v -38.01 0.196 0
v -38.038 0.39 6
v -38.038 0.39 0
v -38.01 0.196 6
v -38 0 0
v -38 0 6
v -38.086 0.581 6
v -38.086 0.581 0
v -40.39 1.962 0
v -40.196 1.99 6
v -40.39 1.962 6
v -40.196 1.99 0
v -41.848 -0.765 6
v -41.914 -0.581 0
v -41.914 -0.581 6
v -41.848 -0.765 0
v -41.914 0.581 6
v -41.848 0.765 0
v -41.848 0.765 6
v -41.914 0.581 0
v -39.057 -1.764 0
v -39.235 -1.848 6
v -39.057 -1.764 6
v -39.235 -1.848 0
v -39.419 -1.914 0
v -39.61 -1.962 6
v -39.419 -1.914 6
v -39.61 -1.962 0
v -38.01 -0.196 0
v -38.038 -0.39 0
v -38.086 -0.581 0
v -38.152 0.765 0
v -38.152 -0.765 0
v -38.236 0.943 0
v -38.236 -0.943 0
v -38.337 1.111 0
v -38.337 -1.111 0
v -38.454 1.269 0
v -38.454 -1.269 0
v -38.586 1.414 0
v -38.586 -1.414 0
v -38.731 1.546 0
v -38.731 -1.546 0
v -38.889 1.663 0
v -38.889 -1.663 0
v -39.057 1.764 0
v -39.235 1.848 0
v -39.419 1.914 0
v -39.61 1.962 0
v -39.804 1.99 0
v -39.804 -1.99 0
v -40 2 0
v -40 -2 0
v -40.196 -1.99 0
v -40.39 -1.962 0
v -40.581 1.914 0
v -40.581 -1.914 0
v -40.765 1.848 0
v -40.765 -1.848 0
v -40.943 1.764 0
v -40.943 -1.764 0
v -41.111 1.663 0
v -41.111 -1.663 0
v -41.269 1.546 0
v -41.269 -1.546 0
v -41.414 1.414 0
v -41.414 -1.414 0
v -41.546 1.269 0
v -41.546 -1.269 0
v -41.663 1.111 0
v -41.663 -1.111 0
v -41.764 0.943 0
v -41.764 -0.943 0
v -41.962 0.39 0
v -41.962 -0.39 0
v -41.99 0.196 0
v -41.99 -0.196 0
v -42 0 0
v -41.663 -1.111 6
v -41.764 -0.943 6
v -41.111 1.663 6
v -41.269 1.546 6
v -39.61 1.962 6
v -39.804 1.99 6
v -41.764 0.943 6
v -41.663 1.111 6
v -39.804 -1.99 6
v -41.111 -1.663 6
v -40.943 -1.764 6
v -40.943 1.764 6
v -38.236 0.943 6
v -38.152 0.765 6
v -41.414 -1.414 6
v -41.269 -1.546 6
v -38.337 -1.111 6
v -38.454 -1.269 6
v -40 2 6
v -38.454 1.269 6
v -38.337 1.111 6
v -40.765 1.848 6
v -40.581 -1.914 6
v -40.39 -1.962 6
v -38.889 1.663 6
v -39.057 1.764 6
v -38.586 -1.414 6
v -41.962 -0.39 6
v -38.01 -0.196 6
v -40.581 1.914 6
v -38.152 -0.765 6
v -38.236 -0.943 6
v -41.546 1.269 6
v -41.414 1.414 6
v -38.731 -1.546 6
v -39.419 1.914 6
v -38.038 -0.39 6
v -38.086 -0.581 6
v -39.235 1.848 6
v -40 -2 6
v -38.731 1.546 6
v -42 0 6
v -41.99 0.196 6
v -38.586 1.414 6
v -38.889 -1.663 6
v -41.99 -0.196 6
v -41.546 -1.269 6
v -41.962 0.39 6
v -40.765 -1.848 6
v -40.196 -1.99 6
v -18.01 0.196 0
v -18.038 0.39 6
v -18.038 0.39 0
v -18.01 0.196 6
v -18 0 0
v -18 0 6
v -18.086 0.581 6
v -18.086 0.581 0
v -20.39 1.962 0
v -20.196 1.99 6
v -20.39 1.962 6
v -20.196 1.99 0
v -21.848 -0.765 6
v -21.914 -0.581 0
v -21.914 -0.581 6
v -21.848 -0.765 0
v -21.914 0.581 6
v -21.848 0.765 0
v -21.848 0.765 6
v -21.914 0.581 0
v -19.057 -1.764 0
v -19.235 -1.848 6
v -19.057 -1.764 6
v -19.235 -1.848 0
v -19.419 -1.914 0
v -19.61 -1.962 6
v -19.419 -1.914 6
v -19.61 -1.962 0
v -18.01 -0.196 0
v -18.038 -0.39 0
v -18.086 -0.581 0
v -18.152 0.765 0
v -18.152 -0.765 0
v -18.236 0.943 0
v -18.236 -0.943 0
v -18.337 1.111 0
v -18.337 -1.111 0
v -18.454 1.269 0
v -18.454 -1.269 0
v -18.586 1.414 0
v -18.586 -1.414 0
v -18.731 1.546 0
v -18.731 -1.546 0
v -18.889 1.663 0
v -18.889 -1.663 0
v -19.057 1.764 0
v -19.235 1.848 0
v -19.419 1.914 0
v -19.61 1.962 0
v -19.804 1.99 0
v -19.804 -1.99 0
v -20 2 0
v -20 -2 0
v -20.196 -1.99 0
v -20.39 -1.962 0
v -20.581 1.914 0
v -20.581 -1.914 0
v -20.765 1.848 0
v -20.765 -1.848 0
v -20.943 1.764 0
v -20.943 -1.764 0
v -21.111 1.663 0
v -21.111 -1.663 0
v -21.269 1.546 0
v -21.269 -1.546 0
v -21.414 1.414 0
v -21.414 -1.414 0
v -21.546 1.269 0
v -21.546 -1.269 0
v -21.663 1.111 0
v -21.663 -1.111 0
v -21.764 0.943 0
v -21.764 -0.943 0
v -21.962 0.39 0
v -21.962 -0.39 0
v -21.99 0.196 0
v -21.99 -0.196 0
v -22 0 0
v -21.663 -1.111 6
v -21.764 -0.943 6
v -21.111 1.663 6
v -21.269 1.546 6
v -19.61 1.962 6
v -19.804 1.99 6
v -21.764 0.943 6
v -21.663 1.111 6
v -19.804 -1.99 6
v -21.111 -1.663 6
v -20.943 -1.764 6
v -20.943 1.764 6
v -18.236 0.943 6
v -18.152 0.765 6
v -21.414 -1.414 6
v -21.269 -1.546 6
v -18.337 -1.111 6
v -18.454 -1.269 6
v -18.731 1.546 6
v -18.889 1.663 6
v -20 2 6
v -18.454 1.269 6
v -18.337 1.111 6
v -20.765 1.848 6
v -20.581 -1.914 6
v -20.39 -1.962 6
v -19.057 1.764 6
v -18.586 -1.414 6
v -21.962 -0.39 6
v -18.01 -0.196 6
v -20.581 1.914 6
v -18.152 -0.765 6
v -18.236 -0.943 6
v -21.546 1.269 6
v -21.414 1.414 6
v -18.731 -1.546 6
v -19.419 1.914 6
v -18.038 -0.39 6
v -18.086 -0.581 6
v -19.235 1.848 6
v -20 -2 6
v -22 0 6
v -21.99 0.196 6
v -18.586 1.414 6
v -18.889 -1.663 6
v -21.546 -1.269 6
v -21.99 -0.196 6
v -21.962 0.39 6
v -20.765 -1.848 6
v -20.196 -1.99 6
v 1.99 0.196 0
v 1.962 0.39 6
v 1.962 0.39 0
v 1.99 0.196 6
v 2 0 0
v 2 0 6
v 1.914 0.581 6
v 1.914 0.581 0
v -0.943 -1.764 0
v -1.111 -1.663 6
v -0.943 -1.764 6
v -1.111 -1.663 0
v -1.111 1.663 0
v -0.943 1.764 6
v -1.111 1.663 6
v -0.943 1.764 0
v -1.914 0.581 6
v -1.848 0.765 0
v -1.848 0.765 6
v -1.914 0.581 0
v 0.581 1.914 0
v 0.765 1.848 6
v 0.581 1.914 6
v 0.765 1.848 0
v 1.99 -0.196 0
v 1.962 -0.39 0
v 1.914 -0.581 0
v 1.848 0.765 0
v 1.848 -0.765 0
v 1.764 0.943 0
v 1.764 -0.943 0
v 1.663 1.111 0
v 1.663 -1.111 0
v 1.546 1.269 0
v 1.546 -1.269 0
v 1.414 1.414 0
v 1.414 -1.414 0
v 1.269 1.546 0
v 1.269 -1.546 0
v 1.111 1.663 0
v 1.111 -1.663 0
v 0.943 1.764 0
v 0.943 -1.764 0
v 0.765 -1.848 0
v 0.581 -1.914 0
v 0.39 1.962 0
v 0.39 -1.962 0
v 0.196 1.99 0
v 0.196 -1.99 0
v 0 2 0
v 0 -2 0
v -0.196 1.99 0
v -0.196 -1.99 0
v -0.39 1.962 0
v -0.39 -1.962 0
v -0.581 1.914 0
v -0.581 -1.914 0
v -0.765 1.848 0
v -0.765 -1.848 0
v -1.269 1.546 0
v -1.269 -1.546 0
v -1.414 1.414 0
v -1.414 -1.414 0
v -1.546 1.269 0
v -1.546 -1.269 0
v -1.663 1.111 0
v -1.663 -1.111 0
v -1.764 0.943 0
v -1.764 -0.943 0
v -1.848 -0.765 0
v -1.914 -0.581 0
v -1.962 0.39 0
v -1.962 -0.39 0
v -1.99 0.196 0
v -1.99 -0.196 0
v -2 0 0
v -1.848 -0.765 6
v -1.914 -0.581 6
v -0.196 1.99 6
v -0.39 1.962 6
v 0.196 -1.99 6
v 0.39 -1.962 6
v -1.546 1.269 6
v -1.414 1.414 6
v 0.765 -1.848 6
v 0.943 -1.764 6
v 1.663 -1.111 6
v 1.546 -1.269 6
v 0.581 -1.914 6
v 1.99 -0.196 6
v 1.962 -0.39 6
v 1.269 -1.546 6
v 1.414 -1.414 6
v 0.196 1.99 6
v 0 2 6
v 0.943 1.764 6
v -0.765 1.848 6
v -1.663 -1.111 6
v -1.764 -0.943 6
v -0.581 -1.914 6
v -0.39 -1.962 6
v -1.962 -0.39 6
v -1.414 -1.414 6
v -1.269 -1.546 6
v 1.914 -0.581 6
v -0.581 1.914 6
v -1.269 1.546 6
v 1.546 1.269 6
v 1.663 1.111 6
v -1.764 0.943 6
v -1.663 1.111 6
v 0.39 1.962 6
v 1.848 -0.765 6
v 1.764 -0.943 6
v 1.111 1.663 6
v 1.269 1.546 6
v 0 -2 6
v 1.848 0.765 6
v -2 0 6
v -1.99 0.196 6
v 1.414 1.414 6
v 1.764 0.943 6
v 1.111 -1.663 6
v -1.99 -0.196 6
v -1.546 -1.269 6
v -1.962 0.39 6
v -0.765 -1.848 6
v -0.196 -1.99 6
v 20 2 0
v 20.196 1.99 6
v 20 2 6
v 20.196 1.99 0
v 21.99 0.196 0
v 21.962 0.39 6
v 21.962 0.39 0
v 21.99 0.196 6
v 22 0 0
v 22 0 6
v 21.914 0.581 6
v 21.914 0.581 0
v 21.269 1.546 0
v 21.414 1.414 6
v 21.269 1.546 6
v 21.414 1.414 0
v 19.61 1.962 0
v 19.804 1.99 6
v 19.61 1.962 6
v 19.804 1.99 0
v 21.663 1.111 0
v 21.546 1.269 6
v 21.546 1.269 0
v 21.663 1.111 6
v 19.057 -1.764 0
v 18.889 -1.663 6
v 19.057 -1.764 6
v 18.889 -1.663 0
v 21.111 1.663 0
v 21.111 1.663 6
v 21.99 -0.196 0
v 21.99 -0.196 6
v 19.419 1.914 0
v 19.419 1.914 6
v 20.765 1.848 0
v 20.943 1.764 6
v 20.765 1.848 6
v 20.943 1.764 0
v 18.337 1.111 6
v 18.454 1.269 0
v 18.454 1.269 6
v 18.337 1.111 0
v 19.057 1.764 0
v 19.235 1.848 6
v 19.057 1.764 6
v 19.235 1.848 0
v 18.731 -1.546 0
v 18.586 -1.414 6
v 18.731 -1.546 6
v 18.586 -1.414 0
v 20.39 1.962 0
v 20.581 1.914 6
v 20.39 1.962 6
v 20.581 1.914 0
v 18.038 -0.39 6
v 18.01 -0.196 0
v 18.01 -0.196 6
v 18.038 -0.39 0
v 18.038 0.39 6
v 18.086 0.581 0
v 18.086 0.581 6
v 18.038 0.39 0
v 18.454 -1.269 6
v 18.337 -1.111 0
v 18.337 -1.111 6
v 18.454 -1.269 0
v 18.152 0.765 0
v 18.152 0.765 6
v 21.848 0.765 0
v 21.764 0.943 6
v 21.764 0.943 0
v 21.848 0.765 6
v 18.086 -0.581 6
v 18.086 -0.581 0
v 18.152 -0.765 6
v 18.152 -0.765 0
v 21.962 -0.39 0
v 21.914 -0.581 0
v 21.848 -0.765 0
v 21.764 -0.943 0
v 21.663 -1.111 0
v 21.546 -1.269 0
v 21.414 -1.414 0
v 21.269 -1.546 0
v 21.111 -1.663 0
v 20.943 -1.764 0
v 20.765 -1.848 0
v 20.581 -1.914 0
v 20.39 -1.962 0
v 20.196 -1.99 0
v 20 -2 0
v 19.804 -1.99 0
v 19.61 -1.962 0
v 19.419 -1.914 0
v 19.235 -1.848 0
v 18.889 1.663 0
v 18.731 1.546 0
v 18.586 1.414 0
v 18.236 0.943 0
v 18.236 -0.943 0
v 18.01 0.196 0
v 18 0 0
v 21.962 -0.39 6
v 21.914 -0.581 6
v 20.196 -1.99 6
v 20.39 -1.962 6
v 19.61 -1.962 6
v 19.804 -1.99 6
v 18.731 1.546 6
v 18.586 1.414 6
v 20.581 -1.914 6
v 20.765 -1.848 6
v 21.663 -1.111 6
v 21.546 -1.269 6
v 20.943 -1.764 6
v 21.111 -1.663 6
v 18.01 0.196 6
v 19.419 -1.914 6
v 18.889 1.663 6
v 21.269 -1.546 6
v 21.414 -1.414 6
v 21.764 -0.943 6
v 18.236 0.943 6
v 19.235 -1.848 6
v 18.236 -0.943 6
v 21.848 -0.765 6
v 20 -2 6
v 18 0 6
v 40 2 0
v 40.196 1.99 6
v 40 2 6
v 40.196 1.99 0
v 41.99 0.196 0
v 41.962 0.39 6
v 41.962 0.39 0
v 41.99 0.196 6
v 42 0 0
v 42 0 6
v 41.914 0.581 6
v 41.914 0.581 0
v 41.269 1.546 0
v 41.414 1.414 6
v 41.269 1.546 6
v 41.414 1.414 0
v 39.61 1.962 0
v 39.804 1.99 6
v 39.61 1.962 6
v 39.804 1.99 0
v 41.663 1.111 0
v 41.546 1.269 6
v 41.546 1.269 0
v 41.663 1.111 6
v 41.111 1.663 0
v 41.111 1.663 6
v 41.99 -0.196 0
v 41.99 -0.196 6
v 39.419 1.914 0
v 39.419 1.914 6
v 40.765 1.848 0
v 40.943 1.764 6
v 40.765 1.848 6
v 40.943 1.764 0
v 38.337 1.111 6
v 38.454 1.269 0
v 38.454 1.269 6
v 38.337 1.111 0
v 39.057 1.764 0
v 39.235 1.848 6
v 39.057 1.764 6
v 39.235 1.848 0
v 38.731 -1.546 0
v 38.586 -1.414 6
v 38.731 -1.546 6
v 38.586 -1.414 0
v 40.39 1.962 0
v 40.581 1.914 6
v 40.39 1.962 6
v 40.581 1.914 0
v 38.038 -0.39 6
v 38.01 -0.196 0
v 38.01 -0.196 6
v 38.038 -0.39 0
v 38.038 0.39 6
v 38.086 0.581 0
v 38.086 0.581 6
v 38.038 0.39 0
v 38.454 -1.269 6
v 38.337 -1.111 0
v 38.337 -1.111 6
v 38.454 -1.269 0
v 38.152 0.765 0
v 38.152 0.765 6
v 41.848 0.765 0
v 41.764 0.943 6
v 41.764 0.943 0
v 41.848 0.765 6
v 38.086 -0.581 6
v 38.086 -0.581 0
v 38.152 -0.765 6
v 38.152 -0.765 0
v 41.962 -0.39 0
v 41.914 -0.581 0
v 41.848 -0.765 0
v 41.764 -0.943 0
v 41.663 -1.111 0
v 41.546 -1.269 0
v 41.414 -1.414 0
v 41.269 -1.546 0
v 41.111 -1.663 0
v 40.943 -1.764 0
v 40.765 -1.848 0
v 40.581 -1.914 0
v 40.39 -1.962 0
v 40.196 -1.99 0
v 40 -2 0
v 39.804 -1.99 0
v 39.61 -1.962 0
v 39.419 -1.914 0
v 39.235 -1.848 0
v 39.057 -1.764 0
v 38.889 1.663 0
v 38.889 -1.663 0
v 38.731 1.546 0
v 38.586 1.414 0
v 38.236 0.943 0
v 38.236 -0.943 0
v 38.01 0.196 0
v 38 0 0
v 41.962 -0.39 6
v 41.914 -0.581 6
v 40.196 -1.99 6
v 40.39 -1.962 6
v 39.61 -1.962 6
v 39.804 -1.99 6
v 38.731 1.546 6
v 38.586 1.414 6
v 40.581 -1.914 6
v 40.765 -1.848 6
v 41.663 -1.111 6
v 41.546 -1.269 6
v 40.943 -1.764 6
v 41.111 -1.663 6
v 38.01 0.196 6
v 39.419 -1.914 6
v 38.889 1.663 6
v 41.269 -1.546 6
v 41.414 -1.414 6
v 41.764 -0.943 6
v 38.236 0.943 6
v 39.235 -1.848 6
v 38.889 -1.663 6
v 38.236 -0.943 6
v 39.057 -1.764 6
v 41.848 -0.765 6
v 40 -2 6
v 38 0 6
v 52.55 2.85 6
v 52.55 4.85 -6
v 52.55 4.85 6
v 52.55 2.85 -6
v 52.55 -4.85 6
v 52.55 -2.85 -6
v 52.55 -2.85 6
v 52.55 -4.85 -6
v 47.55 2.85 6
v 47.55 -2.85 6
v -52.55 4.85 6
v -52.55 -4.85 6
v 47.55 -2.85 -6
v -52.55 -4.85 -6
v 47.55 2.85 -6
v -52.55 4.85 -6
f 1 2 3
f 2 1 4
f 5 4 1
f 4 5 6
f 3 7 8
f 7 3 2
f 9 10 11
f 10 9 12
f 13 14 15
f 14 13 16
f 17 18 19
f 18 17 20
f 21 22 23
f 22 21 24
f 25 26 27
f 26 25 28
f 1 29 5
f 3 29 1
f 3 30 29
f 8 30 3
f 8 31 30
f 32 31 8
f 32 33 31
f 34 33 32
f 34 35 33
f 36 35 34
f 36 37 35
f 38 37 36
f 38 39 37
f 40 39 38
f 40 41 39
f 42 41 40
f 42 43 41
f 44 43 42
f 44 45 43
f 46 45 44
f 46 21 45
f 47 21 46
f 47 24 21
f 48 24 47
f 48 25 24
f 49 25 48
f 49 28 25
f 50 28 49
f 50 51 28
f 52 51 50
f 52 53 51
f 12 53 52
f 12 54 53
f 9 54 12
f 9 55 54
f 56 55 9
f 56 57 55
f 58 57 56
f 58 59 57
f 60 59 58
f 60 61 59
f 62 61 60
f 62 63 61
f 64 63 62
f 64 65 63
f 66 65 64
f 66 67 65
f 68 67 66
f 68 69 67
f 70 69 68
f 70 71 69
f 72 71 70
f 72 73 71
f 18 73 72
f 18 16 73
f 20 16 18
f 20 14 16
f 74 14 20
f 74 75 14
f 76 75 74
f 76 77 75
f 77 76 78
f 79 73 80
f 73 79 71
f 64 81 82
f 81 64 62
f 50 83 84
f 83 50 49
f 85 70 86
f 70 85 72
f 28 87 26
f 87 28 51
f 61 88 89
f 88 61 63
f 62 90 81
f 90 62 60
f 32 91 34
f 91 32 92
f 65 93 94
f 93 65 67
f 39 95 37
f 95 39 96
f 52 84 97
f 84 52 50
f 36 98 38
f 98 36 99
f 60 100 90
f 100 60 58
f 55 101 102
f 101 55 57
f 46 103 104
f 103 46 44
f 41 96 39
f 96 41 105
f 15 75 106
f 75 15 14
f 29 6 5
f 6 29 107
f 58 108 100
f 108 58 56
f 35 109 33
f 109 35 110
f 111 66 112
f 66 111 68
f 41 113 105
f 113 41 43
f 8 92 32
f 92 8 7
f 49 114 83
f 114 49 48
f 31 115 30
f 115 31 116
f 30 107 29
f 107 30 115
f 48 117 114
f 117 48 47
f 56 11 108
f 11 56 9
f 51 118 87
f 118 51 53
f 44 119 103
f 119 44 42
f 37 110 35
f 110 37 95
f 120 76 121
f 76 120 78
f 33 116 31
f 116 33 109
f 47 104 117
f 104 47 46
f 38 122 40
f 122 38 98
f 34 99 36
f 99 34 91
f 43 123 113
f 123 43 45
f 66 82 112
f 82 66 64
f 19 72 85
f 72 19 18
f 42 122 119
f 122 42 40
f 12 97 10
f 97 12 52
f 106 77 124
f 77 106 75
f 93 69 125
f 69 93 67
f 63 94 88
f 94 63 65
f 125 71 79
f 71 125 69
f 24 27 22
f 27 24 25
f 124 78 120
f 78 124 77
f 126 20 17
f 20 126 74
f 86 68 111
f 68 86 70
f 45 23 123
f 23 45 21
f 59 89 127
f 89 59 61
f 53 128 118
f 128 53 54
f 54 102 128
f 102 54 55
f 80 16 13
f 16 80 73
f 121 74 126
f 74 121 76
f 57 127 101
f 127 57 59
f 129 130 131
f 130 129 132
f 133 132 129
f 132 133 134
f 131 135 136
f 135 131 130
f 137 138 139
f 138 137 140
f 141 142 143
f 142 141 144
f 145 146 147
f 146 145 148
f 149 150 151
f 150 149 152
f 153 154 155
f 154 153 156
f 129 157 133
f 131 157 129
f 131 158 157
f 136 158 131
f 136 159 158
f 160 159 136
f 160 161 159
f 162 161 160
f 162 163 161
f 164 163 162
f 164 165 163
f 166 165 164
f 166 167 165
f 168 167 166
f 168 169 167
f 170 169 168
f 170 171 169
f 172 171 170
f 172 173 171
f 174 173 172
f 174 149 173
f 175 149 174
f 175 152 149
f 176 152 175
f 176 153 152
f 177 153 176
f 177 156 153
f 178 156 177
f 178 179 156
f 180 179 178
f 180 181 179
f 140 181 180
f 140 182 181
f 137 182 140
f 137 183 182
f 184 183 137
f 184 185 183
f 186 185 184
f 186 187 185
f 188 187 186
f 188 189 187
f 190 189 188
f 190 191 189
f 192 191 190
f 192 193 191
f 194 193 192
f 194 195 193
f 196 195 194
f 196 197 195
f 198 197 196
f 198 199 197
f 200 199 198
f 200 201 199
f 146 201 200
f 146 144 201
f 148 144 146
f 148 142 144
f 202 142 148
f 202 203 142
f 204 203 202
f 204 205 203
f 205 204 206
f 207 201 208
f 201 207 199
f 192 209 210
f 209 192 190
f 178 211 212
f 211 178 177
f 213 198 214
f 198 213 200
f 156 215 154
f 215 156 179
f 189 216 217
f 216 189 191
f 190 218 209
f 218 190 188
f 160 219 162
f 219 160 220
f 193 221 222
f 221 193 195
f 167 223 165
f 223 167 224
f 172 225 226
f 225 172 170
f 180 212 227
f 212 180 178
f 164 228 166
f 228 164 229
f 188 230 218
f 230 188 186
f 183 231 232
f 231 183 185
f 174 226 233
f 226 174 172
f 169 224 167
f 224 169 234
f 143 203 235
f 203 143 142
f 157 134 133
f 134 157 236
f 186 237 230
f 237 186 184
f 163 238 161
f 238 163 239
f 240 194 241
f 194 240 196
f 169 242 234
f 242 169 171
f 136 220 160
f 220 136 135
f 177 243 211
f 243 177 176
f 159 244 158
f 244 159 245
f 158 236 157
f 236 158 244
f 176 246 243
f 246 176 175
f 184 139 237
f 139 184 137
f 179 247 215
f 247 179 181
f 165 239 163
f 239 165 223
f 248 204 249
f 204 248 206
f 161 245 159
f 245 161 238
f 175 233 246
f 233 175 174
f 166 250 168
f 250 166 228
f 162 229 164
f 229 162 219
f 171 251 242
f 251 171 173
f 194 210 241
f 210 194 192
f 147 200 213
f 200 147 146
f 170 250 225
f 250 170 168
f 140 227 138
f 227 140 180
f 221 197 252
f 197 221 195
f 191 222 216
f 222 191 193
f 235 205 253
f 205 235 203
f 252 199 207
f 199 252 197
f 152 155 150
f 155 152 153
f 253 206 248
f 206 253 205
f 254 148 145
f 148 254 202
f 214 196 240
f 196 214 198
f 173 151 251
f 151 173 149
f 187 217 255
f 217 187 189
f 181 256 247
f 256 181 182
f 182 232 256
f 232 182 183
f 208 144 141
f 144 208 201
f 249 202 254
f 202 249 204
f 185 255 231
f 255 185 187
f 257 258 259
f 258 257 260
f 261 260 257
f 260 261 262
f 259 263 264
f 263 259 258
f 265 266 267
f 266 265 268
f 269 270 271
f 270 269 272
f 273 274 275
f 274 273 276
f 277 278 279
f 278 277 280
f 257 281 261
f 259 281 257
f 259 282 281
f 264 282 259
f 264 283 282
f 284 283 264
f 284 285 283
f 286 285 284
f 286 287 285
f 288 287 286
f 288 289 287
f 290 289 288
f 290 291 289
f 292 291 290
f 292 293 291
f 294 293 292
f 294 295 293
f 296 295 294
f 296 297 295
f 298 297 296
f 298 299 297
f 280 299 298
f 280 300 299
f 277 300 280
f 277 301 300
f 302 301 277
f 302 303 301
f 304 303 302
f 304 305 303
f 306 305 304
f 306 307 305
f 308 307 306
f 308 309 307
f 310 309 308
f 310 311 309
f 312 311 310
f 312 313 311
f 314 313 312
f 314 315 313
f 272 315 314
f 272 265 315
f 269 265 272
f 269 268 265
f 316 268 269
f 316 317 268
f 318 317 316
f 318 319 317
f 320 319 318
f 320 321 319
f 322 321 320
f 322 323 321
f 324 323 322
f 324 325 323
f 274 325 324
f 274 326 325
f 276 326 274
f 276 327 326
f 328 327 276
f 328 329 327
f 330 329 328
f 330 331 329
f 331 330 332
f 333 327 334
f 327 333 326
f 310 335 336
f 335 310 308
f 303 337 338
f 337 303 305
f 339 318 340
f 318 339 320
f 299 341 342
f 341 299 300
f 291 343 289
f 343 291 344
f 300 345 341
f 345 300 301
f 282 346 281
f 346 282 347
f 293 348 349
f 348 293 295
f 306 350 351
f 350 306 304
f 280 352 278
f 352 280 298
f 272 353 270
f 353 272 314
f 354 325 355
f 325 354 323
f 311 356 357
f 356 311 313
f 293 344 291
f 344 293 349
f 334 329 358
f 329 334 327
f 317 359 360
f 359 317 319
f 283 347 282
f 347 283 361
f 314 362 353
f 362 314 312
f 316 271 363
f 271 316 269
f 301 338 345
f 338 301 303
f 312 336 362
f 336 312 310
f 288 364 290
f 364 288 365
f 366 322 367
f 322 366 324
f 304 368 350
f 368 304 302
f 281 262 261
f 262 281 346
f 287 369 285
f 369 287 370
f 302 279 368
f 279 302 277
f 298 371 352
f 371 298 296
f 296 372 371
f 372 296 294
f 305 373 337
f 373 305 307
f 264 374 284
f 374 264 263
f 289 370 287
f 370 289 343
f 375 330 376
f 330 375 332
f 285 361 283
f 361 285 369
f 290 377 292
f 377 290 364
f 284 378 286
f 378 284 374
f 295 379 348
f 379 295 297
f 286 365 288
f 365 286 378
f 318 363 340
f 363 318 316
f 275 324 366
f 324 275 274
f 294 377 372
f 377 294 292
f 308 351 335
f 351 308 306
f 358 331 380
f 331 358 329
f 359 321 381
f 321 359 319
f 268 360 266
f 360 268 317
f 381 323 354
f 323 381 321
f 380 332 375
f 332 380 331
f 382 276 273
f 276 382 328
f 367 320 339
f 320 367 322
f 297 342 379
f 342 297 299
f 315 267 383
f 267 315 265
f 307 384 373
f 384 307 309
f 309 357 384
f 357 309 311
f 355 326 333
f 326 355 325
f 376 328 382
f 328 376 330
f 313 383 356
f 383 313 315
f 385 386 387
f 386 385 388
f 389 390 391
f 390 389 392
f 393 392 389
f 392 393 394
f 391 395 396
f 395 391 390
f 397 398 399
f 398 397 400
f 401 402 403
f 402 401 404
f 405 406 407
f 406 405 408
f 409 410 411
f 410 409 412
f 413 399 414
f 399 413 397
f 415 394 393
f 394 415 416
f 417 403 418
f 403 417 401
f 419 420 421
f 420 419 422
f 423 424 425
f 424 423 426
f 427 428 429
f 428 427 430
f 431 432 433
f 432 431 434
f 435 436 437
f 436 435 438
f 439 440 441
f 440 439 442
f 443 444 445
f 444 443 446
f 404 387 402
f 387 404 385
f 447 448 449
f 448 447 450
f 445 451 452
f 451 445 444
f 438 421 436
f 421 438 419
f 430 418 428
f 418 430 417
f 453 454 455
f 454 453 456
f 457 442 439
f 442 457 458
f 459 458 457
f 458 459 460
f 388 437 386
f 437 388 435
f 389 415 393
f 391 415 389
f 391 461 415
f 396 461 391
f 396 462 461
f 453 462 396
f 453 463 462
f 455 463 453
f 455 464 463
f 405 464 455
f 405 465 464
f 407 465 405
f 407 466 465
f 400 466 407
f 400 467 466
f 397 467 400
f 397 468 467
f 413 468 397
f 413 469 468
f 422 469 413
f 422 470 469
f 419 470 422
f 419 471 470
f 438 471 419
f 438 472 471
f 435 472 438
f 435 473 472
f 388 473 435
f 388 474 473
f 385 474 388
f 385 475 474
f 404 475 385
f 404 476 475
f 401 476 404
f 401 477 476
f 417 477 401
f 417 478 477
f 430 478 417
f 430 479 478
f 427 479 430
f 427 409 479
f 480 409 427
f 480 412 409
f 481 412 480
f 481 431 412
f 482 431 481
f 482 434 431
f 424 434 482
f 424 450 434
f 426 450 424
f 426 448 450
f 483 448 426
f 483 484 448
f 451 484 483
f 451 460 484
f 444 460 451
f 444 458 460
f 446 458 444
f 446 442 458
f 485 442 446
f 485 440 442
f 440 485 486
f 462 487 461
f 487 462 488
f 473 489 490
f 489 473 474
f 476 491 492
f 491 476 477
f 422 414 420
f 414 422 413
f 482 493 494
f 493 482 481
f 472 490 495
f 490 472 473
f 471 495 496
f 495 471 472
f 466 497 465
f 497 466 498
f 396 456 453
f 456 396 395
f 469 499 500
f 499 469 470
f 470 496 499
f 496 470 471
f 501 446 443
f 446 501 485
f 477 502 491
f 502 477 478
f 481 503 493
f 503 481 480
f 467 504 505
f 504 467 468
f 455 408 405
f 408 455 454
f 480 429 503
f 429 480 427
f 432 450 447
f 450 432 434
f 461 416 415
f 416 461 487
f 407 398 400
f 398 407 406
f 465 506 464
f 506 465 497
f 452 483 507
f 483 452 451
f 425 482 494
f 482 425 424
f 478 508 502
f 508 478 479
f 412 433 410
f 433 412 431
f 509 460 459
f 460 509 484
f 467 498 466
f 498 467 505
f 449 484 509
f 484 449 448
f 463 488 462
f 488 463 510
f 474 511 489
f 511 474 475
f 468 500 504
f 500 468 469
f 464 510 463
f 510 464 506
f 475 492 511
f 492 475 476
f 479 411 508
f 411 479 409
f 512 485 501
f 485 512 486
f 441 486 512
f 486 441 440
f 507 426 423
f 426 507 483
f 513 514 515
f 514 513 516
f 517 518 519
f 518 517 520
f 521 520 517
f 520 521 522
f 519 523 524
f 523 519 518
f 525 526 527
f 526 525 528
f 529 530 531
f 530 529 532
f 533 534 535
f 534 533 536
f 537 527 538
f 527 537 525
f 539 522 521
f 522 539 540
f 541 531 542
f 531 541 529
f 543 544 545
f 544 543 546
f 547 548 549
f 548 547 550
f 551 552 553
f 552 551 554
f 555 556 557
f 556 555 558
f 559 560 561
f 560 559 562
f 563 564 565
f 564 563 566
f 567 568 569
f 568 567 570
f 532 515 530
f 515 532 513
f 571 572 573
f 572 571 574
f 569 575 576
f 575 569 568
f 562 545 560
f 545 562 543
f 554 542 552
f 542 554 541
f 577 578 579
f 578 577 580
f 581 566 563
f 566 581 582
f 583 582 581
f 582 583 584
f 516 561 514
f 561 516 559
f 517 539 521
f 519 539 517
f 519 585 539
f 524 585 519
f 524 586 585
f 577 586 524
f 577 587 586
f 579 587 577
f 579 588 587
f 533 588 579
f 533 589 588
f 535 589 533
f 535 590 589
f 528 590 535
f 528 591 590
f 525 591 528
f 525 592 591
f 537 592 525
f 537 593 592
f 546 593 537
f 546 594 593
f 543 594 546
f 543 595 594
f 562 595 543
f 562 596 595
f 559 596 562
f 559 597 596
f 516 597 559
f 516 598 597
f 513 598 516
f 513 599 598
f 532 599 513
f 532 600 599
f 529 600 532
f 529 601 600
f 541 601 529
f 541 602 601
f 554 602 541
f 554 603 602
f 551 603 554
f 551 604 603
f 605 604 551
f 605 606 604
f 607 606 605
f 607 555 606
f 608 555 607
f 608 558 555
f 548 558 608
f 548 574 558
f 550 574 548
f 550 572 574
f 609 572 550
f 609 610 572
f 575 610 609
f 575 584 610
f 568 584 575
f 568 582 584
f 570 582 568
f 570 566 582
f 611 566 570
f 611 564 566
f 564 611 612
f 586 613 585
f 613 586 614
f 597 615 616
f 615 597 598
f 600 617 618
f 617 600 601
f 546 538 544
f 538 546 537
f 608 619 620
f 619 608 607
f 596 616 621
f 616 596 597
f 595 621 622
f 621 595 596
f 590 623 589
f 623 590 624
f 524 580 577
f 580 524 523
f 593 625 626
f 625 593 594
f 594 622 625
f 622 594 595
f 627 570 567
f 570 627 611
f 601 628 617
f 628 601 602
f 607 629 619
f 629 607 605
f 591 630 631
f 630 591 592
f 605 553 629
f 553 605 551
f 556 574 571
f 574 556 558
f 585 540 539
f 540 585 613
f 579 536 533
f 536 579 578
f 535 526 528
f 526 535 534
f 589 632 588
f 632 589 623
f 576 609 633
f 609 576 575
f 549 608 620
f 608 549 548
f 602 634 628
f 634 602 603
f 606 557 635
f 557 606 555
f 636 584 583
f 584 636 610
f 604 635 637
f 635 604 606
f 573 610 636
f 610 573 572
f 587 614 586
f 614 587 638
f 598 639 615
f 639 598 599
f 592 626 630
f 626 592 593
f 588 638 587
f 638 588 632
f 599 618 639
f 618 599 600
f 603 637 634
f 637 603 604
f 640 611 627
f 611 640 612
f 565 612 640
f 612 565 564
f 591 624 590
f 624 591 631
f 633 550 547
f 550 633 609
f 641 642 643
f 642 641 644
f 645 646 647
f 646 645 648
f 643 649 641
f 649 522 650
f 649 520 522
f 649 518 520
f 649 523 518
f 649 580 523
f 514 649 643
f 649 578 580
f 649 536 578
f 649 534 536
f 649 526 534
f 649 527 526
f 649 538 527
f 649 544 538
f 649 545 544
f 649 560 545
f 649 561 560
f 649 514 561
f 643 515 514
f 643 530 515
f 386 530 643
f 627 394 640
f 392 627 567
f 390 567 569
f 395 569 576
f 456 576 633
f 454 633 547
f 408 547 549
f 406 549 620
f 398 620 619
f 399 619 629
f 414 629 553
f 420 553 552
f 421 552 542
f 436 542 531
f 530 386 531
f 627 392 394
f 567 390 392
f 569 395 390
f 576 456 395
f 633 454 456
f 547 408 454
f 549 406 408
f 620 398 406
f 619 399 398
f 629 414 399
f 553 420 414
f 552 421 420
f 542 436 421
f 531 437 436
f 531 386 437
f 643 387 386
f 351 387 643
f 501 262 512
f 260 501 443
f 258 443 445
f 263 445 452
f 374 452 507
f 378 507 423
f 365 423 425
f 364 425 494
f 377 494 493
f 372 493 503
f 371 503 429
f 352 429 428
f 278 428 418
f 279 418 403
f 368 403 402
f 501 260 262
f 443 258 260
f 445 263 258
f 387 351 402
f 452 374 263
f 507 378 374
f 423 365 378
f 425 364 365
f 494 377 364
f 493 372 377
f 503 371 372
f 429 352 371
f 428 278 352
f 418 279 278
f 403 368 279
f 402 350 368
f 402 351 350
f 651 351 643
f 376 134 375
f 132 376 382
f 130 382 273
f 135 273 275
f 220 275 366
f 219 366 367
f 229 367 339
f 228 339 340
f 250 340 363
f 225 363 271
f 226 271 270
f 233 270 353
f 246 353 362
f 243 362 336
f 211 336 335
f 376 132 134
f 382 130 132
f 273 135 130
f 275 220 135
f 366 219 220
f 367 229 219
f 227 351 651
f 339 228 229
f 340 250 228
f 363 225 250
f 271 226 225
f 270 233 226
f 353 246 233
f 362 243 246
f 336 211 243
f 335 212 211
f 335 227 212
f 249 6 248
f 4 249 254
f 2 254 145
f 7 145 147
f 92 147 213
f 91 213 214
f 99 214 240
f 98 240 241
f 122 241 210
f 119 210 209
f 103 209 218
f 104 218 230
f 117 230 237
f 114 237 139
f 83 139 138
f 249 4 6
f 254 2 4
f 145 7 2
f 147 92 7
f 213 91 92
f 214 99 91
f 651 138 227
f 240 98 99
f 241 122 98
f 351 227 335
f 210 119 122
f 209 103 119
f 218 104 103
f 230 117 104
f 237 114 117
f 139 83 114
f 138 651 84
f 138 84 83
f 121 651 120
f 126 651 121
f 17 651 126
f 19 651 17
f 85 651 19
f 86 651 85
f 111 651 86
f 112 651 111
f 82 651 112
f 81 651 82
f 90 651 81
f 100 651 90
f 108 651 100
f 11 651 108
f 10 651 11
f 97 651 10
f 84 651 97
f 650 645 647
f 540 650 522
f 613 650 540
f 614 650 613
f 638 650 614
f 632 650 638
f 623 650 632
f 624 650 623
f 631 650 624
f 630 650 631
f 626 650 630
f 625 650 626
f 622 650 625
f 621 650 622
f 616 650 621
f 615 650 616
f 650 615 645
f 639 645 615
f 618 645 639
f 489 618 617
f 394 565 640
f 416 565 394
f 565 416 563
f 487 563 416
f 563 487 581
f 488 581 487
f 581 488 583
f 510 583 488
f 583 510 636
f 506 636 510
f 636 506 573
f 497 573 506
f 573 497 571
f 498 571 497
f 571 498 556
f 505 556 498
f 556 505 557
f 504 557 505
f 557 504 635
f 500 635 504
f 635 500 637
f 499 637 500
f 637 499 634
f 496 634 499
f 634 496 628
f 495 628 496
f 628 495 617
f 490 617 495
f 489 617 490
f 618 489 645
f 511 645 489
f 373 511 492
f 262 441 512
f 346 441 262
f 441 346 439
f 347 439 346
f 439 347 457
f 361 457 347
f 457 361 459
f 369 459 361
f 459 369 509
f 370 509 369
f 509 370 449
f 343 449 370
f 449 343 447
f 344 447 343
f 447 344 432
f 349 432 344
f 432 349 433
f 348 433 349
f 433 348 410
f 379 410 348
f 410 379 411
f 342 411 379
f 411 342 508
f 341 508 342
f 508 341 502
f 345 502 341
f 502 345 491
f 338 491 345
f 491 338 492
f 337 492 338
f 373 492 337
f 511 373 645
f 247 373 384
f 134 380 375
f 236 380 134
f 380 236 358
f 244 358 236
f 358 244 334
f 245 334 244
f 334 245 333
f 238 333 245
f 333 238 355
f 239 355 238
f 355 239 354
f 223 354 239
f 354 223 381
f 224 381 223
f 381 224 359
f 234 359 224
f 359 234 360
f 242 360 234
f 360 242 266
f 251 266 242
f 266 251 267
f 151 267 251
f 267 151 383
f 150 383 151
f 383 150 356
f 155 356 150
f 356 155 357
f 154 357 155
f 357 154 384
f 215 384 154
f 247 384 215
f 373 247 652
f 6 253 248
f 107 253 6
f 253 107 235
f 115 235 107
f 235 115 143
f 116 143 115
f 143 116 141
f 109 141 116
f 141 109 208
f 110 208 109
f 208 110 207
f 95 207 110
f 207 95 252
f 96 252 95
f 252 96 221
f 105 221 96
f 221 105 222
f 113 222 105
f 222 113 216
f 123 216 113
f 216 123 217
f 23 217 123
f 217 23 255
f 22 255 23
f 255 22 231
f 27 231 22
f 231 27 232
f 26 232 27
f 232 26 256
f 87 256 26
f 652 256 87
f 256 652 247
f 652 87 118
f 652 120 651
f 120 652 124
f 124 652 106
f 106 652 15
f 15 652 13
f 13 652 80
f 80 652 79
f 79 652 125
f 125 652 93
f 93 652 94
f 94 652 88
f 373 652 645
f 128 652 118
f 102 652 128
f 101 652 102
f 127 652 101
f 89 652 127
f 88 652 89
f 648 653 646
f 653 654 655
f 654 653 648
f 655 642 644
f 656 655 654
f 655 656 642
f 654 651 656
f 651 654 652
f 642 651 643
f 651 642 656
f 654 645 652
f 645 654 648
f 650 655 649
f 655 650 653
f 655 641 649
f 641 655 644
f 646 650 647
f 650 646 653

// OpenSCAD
module prismatic_bar() {
    difference() {
        // Main bar
        translate([-52.55, -4.85, -6])
            cube([105.1, 9.7, 12]);

        // Circular through-holes
        for (i = [-40, -20, 0, 20, 40]) {
            translate([i, 0, 0])
                cylinder(h = 12, r = 2, $fn = 64);
        }

        // U-shaped forked slot
        translate([47.55, -2.85, -6])
            cube([10, 5.7, 12]);
    }
}

prismatic_bar();
